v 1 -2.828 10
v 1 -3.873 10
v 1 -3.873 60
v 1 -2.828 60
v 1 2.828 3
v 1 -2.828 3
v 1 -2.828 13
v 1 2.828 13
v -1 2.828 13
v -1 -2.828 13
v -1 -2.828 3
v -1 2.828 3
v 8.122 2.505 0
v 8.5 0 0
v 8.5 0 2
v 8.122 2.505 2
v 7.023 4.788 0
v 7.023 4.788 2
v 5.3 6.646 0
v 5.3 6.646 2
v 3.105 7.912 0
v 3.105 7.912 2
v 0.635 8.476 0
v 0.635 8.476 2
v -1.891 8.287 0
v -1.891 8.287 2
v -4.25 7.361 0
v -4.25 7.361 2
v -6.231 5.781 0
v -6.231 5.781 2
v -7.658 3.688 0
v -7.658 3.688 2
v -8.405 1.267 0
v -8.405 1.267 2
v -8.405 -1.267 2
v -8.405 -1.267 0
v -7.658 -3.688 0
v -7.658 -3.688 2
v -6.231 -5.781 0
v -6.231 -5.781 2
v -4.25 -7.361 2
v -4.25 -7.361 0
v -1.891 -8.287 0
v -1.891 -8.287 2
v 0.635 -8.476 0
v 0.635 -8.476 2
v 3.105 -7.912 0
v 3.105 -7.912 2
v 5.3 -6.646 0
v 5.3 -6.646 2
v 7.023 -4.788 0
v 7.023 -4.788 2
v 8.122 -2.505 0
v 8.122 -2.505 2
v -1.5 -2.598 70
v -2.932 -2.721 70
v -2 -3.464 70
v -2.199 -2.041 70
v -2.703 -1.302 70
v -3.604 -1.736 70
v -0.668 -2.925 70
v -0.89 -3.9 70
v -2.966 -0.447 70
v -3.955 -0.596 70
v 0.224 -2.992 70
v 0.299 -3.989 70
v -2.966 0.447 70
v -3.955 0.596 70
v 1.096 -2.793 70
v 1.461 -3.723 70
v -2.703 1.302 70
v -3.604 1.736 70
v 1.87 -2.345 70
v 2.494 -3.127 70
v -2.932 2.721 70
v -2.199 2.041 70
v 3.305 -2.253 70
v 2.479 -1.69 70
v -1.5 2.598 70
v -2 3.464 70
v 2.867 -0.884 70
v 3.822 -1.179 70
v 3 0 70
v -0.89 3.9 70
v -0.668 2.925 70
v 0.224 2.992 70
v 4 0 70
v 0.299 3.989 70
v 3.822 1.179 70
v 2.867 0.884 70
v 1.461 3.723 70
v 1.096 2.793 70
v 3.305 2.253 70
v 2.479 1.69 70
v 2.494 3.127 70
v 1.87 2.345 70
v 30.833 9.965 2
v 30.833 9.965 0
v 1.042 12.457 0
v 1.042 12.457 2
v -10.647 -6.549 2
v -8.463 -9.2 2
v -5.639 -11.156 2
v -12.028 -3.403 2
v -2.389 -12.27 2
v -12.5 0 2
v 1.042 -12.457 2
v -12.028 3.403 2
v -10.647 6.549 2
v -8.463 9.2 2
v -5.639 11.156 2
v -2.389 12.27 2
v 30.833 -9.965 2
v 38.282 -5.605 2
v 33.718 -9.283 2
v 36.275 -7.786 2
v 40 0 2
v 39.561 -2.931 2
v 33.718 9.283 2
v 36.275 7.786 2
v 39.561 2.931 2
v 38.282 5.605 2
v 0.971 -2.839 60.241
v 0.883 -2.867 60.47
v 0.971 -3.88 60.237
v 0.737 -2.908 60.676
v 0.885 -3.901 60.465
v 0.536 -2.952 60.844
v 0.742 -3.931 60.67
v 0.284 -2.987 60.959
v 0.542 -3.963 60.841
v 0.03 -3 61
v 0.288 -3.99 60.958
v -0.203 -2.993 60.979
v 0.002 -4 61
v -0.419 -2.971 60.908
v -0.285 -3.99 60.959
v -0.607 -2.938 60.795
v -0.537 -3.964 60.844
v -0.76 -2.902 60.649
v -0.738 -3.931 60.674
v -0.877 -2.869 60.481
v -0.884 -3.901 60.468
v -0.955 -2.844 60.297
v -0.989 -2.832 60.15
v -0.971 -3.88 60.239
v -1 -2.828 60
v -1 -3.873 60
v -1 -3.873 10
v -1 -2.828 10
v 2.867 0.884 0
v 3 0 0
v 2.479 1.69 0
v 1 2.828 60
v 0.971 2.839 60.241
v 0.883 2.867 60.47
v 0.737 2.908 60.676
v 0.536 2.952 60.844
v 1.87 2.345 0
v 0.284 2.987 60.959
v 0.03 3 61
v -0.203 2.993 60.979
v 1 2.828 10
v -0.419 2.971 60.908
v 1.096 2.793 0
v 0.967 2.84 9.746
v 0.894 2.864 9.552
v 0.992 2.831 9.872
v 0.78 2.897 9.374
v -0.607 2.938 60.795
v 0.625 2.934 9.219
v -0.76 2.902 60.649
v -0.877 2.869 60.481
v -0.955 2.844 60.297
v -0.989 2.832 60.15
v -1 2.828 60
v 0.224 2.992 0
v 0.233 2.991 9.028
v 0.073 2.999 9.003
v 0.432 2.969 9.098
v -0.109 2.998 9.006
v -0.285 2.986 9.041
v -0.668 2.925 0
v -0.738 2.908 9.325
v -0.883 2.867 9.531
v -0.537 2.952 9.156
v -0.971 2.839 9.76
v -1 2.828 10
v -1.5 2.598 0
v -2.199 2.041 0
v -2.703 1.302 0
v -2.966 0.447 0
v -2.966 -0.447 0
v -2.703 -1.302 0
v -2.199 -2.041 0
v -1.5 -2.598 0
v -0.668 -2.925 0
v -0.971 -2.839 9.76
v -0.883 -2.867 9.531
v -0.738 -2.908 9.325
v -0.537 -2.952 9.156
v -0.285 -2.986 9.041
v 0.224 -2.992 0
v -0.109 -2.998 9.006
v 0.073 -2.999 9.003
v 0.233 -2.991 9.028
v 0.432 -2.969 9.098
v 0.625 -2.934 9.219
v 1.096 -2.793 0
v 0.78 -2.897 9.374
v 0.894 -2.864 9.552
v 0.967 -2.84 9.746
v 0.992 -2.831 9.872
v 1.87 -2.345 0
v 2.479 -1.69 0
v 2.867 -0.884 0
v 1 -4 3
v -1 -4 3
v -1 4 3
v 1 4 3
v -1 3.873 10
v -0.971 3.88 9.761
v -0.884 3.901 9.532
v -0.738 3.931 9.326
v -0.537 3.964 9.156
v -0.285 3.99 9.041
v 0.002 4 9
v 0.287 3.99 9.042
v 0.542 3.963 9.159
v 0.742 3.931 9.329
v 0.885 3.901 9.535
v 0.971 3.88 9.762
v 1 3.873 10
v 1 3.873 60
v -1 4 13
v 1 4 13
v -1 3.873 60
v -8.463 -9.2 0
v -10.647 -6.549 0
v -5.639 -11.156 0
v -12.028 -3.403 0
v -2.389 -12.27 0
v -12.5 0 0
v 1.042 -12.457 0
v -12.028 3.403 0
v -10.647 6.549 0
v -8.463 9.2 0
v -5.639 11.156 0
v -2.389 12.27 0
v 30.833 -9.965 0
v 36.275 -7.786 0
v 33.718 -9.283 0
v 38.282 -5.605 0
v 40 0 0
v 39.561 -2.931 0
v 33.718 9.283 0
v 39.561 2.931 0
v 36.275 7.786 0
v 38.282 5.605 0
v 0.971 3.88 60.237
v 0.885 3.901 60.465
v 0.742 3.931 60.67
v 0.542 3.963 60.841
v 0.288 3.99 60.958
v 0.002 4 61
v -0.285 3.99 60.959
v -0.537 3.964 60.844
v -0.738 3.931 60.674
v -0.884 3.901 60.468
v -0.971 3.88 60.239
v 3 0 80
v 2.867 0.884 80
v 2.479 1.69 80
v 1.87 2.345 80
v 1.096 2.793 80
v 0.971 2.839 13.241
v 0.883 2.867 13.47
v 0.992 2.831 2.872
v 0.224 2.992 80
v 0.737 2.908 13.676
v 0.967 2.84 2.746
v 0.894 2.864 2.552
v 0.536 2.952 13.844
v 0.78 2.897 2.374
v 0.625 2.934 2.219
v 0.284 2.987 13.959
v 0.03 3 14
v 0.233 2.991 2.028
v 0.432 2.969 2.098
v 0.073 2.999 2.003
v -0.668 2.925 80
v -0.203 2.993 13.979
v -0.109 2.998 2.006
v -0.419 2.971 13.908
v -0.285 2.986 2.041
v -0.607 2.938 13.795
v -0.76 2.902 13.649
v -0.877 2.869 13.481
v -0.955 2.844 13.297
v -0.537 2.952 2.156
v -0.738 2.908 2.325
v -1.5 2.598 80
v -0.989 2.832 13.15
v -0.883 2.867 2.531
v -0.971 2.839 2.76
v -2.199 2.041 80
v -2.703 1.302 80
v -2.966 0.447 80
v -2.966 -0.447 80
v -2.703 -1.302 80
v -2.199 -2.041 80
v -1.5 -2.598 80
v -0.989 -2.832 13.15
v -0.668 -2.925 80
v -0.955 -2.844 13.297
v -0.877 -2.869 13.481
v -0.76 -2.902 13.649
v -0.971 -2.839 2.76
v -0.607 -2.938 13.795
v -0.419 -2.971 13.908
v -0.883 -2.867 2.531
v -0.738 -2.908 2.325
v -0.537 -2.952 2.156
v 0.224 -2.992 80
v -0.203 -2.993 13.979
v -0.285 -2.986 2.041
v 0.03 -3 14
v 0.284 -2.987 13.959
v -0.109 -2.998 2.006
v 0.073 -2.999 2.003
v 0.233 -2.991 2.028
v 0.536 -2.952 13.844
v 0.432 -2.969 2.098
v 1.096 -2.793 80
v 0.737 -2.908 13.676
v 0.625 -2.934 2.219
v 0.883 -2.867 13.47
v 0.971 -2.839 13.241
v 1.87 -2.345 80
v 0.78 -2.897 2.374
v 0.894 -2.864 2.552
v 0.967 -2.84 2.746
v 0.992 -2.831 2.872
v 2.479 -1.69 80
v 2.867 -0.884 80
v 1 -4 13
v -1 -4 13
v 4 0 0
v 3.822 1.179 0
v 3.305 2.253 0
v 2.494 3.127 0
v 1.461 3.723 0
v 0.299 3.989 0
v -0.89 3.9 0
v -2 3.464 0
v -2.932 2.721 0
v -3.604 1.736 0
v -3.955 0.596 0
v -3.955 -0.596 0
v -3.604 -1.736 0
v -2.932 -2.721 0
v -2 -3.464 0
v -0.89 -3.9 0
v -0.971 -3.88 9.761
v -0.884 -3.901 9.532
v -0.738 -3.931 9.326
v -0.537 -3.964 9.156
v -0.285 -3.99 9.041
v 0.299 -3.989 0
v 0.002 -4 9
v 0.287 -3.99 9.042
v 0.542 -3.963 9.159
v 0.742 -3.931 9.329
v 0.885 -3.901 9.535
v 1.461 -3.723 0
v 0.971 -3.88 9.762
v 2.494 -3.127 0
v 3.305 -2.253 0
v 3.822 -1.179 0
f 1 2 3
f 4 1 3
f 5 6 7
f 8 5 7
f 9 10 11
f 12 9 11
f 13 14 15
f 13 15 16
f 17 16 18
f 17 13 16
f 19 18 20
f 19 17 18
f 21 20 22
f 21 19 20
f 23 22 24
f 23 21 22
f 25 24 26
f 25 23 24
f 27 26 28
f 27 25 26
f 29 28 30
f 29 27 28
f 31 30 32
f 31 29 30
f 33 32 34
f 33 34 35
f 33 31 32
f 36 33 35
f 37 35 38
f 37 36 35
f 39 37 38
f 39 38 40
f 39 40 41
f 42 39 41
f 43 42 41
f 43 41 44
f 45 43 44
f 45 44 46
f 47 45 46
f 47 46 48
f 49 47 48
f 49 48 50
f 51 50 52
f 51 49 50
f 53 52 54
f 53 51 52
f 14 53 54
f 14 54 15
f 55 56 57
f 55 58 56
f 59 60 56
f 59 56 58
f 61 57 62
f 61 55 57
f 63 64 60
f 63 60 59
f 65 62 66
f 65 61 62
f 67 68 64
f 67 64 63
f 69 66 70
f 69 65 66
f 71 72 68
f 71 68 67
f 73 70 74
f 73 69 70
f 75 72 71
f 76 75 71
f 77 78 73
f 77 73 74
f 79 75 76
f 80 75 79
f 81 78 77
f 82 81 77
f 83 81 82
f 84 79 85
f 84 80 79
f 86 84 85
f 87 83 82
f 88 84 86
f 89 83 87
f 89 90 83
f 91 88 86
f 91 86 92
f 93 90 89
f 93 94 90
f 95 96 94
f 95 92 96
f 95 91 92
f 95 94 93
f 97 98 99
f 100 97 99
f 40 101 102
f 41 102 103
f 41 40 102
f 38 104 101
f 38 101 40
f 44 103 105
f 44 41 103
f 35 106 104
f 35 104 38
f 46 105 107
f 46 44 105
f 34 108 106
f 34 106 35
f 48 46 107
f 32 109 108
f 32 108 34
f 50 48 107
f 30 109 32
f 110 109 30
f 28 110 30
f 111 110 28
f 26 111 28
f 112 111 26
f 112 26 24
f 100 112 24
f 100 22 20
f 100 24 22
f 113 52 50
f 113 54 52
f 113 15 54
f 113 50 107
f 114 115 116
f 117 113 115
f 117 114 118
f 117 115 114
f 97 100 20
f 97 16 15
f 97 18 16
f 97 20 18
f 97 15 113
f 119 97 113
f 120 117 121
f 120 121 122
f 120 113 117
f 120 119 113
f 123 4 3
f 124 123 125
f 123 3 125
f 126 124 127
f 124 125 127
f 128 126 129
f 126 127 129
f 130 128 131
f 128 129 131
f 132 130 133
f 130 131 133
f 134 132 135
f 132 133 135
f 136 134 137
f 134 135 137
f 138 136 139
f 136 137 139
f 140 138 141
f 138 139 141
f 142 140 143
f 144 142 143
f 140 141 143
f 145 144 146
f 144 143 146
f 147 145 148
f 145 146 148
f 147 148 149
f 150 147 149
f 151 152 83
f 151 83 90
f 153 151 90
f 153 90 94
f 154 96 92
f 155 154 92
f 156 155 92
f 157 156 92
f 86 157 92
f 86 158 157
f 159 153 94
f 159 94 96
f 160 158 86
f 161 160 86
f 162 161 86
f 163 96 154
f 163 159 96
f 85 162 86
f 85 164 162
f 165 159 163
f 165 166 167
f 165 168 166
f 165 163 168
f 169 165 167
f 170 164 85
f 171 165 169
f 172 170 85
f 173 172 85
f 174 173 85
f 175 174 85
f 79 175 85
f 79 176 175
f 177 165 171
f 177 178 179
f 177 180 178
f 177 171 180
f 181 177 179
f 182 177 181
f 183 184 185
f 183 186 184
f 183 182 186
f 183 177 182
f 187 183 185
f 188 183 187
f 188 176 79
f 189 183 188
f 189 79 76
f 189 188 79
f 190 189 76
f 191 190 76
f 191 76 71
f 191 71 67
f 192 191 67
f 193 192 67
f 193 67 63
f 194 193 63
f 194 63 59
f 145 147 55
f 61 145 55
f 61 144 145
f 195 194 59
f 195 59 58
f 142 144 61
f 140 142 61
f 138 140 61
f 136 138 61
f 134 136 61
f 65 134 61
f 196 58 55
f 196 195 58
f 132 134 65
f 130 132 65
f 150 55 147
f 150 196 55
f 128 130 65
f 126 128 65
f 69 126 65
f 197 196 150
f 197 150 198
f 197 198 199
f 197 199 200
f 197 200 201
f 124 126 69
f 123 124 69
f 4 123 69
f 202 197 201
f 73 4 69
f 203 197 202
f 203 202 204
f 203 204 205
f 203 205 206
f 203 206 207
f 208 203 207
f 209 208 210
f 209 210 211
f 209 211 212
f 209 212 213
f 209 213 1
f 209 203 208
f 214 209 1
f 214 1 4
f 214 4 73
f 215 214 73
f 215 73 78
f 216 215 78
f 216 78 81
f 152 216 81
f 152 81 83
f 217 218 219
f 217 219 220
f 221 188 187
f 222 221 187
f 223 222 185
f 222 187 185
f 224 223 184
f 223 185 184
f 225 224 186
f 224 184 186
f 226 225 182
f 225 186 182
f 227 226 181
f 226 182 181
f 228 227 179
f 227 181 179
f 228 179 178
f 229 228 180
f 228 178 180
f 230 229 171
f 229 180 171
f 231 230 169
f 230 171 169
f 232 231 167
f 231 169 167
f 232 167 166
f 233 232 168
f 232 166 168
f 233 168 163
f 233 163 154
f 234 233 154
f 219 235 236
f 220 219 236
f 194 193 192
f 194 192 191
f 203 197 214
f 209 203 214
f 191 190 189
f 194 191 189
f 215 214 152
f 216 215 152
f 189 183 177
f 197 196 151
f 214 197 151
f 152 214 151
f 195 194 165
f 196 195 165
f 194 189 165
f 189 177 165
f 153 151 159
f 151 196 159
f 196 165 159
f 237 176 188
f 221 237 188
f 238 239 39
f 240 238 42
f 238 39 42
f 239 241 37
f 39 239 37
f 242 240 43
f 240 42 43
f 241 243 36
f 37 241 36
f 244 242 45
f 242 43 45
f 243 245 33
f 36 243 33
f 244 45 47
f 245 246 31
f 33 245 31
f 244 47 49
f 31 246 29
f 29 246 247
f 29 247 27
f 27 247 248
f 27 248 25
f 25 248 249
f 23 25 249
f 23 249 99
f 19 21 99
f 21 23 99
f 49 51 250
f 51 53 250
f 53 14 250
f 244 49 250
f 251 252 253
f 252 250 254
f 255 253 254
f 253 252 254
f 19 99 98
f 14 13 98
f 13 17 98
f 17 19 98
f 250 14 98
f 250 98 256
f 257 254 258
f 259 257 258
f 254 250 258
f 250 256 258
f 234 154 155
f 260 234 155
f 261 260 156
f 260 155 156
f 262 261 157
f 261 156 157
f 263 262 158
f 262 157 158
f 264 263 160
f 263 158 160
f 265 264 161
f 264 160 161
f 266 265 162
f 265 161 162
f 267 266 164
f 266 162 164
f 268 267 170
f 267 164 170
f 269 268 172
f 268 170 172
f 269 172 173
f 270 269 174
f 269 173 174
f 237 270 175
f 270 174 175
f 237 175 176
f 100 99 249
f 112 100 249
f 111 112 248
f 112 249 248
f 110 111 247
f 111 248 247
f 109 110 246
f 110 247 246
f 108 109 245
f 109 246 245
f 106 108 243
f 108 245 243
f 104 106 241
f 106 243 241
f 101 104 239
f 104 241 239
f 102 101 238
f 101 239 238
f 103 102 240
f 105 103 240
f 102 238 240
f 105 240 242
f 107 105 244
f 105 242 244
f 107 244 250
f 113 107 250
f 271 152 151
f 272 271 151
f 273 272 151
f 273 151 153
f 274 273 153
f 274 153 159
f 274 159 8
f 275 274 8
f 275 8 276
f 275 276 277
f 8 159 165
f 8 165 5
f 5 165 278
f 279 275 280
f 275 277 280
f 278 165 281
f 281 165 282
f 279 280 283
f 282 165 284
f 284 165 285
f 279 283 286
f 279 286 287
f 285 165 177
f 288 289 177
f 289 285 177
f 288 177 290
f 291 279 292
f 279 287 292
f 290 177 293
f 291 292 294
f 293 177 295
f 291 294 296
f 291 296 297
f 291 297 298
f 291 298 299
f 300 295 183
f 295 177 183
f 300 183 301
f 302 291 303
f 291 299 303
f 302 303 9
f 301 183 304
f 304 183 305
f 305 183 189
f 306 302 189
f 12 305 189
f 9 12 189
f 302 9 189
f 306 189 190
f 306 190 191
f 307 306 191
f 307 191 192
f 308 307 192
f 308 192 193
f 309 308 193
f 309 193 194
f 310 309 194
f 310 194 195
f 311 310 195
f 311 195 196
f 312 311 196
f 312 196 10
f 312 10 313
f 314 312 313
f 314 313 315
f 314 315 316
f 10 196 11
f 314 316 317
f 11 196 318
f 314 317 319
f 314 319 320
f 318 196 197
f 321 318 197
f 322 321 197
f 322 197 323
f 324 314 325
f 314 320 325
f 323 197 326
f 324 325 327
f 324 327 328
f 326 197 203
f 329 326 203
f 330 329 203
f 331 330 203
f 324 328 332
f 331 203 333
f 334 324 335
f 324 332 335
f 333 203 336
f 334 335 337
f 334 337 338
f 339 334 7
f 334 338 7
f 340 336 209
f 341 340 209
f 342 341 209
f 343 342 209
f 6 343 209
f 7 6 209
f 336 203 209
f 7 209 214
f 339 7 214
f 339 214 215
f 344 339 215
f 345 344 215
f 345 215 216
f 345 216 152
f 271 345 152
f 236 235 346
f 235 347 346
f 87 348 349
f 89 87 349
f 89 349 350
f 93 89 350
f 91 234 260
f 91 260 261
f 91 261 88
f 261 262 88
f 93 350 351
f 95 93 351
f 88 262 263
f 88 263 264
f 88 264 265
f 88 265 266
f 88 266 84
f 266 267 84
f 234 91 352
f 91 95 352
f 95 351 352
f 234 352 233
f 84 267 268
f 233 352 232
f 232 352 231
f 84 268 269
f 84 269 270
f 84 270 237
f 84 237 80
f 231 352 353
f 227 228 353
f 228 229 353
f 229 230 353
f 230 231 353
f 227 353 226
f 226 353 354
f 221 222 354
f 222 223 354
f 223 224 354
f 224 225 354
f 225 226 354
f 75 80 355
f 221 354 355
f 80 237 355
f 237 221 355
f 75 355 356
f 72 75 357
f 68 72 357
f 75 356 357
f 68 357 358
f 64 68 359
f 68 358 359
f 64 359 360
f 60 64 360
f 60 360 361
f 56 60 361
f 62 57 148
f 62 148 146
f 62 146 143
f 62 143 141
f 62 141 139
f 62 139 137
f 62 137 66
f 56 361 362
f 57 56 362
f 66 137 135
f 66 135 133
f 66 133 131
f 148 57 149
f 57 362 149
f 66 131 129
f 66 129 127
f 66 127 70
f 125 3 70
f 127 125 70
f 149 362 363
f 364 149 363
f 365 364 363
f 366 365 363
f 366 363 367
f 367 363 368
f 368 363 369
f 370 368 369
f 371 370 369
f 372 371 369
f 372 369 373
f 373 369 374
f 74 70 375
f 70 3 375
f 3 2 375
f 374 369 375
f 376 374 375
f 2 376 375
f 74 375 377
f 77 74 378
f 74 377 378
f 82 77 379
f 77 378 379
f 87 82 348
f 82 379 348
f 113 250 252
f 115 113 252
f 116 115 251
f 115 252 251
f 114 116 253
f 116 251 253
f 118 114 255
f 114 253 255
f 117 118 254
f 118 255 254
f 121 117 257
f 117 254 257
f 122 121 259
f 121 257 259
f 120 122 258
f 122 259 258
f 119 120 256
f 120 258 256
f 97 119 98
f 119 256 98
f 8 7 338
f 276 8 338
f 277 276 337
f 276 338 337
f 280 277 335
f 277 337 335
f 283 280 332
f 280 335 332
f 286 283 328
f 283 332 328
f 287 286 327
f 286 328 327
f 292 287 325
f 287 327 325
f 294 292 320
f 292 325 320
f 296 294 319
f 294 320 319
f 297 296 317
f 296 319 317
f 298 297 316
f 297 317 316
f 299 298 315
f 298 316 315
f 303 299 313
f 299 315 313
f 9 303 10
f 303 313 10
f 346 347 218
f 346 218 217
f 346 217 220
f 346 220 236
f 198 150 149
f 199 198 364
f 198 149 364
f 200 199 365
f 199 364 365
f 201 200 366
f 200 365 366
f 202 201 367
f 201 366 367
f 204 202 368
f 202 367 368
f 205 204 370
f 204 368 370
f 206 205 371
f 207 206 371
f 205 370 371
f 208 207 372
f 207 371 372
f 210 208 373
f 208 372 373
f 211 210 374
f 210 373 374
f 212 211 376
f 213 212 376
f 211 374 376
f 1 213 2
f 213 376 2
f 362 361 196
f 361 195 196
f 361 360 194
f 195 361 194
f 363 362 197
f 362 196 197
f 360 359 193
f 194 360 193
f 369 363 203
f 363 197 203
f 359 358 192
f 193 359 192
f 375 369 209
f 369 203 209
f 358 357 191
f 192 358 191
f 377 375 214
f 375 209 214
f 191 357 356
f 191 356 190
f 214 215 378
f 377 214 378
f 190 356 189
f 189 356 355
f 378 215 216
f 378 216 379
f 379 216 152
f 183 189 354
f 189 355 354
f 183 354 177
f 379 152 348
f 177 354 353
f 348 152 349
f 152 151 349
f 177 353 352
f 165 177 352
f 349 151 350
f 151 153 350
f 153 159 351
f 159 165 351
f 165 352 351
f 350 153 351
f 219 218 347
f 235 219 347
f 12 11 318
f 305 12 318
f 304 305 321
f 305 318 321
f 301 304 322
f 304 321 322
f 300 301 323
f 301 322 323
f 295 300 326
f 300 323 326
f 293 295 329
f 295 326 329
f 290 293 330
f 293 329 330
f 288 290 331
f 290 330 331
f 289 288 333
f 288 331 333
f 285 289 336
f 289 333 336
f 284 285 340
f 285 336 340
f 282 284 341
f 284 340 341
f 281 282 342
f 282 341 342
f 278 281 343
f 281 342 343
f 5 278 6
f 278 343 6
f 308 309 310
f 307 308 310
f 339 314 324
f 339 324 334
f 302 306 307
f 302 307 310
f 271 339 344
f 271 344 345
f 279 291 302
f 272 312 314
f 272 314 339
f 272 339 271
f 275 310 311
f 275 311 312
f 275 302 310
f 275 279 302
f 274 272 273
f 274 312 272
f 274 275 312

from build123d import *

# Parameters (mm, degrees)
F0_R      = 4
F0_R_2    = 3
F1_DEPTH  = 70
F3_DEPTH  = 12.5
F4_R      = 3
F5_DEPTH  = 80
F8_DEPTH  = 12.5
F6_W      = 2
F6_H      = 10
F9_DEPTH  = 4
F10_R     = 8.5
F11_DEPTH = 2


with BuildPart() as f1:
    # F0 (on Top) → F1 (new body)
    with BuildSketch(Plane.XY):
        Circle(F0_R)
        Circle(F0_R_2, mode=Mode.SUBTRACT)
    extrude(amount=F1_DEPTH)

    # F2 (on Front) → F3 (cut, symmetric)
    with BuildSketch(Plane.XZ):
        with BuildLine():
            ThreePointArc((1, 60), (0, 61), (-1, 60))
            Line((-1, 60), (-1, 10))
            ThreePointArc((-1, 10), (0, 9), (1, 10))
            Line((1, 10), (1, 60))
        make_face()
    extrude(amount=F3_DEPTH, both=True, mode=Mode.SUBTRACT)


with BuildPart() as f5:
    # F4 (on Top) → F5 (new body)
    with BuildSketch(Plane.XY):
        Circle(F4_R)
    extrude(amount=F5_DEPTH)

    # F7 (on Front) → F8 (cut, symmetric)
    with BuildSketch(Plane.XZ):
        with BuildLine():
            ThreePointArc((1, 13), (0, 14), (-1, 13))
            Line((-1, 13), (-1, 3))
            ThreePointArc((-1, 3), (0, 2), (1, 3))
            Line((1, 3), (1, 13))
        make_face()
    extrude(amount=F8_DEPTH, both=True, mode=Mode.SUBTRACT)


with BuildPart() as f9:
    # F6 (on Front) → F9 (new body, symmetric)
    with BuildSketch(Plane.XZ):
        with Locations((0, 8)):
            Rectangle(F6_W, F6_H)
    extrude(amount=F9_DEPTH, both=True)


with BuildPart() as f11:
    # F10 (on Top) → F11 (new body)
    with BuildSketch(Plane.XY):
        with BuildLine():
            ThreePointArc((40, 0), (37.3598007219, 6.7700320039), (30.8333333333, 9.9652172859))
            ThreePointArc((30.8333333333, 9.9652172859), (20, 0), (30.8333333333, -9.9652172859))
            ThreePointArc((30.8333333333, -9.9652172859), (37.3598007219, -6.7700320039), (40, 0))
        make_face()
        with BuildLine():
            ThreePointArc((1.0416666667, 12.4565216074), (9.1997509024, 8.4625400048), (12.5, 0))
            ThreePointArc((12.5, 0), (9.1997509024, -8.4625400048), (1.0416666667, -12.4565216074))
            Line((1.0416666667, -12.4565216074), (30.8333333333, -9.9652172859))
            ThreePointArc((30.8333333333, -9.9652172859), (20, 0), (30.8333333333, 9.9652172859))
            Line((30.8333333333, 9.9652172859), (1.0416666667, 12.4565216074))
        make_face()
        with BuildLine():
            ThreePointArc((1.0416666667, -12.4565216074), (9.1997509024, -8.4625400048), (12.5, 0))
            ThreePointArc((12.5, 0), (9.1997509024, 8.4625400048), (1.0416666667, 12.4565216074))
            ThreePointArc((1.0416666667, 12.4565216074), (-12.5, 0), (1.0416666667, -12.4565216074))
        make_face()
        Circle(F10_R, mode=Mode.SUBTRACT)
    extrude(amount=F11_DEPTH)


solid = Compound([f1.part, f5.part, f9.part, f11.part])
